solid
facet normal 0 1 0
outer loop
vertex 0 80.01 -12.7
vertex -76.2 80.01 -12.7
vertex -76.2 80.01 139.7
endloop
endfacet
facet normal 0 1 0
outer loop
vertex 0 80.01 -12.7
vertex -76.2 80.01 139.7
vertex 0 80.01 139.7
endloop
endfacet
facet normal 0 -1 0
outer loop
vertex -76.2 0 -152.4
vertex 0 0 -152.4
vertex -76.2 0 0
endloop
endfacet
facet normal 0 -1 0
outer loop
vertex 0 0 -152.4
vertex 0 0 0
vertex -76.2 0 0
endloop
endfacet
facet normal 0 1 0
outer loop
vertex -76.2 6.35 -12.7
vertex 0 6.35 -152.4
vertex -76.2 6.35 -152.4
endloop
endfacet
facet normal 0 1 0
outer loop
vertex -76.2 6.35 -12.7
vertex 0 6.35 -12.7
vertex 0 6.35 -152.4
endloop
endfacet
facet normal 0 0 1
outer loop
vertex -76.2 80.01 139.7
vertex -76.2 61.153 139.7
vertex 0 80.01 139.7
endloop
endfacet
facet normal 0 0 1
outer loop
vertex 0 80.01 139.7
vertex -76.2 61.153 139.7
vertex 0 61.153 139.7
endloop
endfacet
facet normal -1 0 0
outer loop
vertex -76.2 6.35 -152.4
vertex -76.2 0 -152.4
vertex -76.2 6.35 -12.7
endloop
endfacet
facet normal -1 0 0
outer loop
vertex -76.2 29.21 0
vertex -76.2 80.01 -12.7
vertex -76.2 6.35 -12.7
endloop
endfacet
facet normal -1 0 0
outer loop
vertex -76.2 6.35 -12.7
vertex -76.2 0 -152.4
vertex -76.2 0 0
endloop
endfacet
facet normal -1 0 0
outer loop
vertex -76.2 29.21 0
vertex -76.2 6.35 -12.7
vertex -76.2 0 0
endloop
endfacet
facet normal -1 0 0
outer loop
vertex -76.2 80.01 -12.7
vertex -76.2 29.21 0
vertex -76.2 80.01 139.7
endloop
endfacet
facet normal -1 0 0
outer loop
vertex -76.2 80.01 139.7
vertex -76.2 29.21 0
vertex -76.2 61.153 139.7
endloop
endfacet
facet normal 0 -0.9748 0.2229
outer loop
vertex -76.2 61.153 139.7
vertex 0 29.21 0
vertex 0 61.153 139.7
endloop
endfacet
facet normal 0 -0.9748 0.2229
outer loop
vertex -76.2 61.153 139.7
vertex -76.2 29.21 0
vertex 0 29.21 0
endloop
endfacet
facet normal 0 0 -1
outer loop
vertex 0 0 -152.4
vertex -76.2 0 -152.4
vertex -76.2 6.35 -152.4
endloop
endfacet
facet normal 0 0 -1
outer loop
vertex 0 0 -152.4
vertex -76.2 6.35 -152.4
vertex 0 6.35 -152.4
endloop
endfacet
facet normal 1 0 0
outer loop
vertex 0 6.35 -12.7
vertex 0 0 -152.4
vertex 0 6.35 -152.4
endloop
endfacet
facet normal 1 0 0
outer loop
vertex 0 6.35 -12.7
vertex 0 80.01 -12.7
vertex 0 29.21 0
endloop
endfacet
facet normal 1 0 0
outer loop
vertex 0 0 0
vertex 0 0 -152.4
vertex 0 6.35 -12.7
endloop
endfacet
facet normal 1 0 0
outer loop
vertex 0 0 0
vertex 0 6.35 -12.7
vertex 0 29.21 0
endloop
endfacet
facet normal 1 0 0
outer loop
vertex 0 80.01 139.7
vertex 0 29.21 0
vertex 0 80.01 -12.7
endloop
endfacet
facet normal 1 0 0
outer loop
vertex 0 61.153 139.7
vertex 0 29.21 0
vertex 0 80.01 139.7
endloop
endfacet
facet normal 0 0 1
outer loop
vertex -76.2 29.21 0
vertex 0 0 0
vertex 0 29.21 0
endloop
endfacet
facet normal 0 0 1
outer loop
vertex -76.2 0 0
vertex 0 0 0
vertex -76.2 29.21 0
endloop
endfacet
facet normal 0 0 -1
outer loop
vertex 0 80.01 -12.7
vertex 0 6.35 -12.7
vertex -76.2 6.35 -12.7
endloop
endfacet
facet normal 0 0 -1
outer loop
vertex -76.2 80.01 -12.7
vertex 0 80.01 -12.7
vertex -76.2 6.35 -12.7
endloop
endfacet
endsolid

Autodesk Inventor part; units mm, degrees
ref_plane "YZ Plane" through (0, 0, 0) normal (1, 0, 0) x (0, 1, 0)
ref_plane "XZ Plane" through (0, 0, 0) normal (0, 1, 0) x (-1, 0, 0)
ref_plane "XY Plane" through (0, 0, 0) normal (0, 0, 1) x (1, 0, 0)
sketch "Sketch1" plane through (0, 0, 0) normal (0, 1, 0) x (-1, 0, 0)
  line L0 (0, 0) -> (76.2, 0)
  line L1 (76.2, 0) -> (76.2, -152.4)
  line L2 (76.2, -152.4) -> (0, -152.4)
  line L3 (0, -152.4) -> (0, 0)
  dimension "d0" = 76.2
  dimension "d1" = 152.4
extrude "Extrusion1" add sketch "Sketch1" along normal blind 6.35
sketch "Sketch2" plane through (0, 6.35, 0) normal (0, 1, 0) x (1, 0, 0)
  line L0 (-76.2, 152.4) -> (-76.2, 0) projected
  line L1 (0, 0) -> (-76.2, 0)
  line L2 (-76.2, 0) -> (-76.2, 12.7)
  line L3 (-76.2, 12.7) -> (0, 12.7)
  line L4 (0, 12.7) -> (0, 0)
  dimension "d4" = 12.7
extrude "Extrusion2" add sketch "Sketch2" along normal blind 22.86
sketch "Sketch3" plane through (0, 29.21, 0) normal (0, 1, 0) x (1, 0, 0)
  line L0 (0, 152.4) -> (0, 0) projected
  line L1 (0, 12.7) -> (-76.2, 12.7)
  line L2 (-76.2, 12.7) -> (-76.2, -139.7)
  line L3 (-76.2, -139.7) -> (0, -139.7)
  line L4 (0, -139.7) -> (0, 12.7)
  line L5 (0, 12.7) -> (-76.2, 12.7) projected
  dimension "d7" = 76.2
  dimension "d8" = 152.4
extrude "Extrusion3" add sketch "Sketch3" along normal blind 50.8
sketch "Sketch4" plane through (-76.2, 0, -152.4) normal (-1, 0, 0) x (0, 0, 1)
  line L0 (292.1, 29.21) -> (152.4, 29.21) projected
  line L1 (152.4, 29.21) -> (292.1, 61.1529)
  line L2 (152.4, 0) -> (152.4, 29.21) projected
  line L3 (152.4, 29.21) -> (292.1, 29.21)
  line L4 (292.1, 29.21) -> (292.1, 80.01) projected
extrude "Extrusion4" cut sketch "Sketch4" against normal through all
properties part number "Pillow Holder"
